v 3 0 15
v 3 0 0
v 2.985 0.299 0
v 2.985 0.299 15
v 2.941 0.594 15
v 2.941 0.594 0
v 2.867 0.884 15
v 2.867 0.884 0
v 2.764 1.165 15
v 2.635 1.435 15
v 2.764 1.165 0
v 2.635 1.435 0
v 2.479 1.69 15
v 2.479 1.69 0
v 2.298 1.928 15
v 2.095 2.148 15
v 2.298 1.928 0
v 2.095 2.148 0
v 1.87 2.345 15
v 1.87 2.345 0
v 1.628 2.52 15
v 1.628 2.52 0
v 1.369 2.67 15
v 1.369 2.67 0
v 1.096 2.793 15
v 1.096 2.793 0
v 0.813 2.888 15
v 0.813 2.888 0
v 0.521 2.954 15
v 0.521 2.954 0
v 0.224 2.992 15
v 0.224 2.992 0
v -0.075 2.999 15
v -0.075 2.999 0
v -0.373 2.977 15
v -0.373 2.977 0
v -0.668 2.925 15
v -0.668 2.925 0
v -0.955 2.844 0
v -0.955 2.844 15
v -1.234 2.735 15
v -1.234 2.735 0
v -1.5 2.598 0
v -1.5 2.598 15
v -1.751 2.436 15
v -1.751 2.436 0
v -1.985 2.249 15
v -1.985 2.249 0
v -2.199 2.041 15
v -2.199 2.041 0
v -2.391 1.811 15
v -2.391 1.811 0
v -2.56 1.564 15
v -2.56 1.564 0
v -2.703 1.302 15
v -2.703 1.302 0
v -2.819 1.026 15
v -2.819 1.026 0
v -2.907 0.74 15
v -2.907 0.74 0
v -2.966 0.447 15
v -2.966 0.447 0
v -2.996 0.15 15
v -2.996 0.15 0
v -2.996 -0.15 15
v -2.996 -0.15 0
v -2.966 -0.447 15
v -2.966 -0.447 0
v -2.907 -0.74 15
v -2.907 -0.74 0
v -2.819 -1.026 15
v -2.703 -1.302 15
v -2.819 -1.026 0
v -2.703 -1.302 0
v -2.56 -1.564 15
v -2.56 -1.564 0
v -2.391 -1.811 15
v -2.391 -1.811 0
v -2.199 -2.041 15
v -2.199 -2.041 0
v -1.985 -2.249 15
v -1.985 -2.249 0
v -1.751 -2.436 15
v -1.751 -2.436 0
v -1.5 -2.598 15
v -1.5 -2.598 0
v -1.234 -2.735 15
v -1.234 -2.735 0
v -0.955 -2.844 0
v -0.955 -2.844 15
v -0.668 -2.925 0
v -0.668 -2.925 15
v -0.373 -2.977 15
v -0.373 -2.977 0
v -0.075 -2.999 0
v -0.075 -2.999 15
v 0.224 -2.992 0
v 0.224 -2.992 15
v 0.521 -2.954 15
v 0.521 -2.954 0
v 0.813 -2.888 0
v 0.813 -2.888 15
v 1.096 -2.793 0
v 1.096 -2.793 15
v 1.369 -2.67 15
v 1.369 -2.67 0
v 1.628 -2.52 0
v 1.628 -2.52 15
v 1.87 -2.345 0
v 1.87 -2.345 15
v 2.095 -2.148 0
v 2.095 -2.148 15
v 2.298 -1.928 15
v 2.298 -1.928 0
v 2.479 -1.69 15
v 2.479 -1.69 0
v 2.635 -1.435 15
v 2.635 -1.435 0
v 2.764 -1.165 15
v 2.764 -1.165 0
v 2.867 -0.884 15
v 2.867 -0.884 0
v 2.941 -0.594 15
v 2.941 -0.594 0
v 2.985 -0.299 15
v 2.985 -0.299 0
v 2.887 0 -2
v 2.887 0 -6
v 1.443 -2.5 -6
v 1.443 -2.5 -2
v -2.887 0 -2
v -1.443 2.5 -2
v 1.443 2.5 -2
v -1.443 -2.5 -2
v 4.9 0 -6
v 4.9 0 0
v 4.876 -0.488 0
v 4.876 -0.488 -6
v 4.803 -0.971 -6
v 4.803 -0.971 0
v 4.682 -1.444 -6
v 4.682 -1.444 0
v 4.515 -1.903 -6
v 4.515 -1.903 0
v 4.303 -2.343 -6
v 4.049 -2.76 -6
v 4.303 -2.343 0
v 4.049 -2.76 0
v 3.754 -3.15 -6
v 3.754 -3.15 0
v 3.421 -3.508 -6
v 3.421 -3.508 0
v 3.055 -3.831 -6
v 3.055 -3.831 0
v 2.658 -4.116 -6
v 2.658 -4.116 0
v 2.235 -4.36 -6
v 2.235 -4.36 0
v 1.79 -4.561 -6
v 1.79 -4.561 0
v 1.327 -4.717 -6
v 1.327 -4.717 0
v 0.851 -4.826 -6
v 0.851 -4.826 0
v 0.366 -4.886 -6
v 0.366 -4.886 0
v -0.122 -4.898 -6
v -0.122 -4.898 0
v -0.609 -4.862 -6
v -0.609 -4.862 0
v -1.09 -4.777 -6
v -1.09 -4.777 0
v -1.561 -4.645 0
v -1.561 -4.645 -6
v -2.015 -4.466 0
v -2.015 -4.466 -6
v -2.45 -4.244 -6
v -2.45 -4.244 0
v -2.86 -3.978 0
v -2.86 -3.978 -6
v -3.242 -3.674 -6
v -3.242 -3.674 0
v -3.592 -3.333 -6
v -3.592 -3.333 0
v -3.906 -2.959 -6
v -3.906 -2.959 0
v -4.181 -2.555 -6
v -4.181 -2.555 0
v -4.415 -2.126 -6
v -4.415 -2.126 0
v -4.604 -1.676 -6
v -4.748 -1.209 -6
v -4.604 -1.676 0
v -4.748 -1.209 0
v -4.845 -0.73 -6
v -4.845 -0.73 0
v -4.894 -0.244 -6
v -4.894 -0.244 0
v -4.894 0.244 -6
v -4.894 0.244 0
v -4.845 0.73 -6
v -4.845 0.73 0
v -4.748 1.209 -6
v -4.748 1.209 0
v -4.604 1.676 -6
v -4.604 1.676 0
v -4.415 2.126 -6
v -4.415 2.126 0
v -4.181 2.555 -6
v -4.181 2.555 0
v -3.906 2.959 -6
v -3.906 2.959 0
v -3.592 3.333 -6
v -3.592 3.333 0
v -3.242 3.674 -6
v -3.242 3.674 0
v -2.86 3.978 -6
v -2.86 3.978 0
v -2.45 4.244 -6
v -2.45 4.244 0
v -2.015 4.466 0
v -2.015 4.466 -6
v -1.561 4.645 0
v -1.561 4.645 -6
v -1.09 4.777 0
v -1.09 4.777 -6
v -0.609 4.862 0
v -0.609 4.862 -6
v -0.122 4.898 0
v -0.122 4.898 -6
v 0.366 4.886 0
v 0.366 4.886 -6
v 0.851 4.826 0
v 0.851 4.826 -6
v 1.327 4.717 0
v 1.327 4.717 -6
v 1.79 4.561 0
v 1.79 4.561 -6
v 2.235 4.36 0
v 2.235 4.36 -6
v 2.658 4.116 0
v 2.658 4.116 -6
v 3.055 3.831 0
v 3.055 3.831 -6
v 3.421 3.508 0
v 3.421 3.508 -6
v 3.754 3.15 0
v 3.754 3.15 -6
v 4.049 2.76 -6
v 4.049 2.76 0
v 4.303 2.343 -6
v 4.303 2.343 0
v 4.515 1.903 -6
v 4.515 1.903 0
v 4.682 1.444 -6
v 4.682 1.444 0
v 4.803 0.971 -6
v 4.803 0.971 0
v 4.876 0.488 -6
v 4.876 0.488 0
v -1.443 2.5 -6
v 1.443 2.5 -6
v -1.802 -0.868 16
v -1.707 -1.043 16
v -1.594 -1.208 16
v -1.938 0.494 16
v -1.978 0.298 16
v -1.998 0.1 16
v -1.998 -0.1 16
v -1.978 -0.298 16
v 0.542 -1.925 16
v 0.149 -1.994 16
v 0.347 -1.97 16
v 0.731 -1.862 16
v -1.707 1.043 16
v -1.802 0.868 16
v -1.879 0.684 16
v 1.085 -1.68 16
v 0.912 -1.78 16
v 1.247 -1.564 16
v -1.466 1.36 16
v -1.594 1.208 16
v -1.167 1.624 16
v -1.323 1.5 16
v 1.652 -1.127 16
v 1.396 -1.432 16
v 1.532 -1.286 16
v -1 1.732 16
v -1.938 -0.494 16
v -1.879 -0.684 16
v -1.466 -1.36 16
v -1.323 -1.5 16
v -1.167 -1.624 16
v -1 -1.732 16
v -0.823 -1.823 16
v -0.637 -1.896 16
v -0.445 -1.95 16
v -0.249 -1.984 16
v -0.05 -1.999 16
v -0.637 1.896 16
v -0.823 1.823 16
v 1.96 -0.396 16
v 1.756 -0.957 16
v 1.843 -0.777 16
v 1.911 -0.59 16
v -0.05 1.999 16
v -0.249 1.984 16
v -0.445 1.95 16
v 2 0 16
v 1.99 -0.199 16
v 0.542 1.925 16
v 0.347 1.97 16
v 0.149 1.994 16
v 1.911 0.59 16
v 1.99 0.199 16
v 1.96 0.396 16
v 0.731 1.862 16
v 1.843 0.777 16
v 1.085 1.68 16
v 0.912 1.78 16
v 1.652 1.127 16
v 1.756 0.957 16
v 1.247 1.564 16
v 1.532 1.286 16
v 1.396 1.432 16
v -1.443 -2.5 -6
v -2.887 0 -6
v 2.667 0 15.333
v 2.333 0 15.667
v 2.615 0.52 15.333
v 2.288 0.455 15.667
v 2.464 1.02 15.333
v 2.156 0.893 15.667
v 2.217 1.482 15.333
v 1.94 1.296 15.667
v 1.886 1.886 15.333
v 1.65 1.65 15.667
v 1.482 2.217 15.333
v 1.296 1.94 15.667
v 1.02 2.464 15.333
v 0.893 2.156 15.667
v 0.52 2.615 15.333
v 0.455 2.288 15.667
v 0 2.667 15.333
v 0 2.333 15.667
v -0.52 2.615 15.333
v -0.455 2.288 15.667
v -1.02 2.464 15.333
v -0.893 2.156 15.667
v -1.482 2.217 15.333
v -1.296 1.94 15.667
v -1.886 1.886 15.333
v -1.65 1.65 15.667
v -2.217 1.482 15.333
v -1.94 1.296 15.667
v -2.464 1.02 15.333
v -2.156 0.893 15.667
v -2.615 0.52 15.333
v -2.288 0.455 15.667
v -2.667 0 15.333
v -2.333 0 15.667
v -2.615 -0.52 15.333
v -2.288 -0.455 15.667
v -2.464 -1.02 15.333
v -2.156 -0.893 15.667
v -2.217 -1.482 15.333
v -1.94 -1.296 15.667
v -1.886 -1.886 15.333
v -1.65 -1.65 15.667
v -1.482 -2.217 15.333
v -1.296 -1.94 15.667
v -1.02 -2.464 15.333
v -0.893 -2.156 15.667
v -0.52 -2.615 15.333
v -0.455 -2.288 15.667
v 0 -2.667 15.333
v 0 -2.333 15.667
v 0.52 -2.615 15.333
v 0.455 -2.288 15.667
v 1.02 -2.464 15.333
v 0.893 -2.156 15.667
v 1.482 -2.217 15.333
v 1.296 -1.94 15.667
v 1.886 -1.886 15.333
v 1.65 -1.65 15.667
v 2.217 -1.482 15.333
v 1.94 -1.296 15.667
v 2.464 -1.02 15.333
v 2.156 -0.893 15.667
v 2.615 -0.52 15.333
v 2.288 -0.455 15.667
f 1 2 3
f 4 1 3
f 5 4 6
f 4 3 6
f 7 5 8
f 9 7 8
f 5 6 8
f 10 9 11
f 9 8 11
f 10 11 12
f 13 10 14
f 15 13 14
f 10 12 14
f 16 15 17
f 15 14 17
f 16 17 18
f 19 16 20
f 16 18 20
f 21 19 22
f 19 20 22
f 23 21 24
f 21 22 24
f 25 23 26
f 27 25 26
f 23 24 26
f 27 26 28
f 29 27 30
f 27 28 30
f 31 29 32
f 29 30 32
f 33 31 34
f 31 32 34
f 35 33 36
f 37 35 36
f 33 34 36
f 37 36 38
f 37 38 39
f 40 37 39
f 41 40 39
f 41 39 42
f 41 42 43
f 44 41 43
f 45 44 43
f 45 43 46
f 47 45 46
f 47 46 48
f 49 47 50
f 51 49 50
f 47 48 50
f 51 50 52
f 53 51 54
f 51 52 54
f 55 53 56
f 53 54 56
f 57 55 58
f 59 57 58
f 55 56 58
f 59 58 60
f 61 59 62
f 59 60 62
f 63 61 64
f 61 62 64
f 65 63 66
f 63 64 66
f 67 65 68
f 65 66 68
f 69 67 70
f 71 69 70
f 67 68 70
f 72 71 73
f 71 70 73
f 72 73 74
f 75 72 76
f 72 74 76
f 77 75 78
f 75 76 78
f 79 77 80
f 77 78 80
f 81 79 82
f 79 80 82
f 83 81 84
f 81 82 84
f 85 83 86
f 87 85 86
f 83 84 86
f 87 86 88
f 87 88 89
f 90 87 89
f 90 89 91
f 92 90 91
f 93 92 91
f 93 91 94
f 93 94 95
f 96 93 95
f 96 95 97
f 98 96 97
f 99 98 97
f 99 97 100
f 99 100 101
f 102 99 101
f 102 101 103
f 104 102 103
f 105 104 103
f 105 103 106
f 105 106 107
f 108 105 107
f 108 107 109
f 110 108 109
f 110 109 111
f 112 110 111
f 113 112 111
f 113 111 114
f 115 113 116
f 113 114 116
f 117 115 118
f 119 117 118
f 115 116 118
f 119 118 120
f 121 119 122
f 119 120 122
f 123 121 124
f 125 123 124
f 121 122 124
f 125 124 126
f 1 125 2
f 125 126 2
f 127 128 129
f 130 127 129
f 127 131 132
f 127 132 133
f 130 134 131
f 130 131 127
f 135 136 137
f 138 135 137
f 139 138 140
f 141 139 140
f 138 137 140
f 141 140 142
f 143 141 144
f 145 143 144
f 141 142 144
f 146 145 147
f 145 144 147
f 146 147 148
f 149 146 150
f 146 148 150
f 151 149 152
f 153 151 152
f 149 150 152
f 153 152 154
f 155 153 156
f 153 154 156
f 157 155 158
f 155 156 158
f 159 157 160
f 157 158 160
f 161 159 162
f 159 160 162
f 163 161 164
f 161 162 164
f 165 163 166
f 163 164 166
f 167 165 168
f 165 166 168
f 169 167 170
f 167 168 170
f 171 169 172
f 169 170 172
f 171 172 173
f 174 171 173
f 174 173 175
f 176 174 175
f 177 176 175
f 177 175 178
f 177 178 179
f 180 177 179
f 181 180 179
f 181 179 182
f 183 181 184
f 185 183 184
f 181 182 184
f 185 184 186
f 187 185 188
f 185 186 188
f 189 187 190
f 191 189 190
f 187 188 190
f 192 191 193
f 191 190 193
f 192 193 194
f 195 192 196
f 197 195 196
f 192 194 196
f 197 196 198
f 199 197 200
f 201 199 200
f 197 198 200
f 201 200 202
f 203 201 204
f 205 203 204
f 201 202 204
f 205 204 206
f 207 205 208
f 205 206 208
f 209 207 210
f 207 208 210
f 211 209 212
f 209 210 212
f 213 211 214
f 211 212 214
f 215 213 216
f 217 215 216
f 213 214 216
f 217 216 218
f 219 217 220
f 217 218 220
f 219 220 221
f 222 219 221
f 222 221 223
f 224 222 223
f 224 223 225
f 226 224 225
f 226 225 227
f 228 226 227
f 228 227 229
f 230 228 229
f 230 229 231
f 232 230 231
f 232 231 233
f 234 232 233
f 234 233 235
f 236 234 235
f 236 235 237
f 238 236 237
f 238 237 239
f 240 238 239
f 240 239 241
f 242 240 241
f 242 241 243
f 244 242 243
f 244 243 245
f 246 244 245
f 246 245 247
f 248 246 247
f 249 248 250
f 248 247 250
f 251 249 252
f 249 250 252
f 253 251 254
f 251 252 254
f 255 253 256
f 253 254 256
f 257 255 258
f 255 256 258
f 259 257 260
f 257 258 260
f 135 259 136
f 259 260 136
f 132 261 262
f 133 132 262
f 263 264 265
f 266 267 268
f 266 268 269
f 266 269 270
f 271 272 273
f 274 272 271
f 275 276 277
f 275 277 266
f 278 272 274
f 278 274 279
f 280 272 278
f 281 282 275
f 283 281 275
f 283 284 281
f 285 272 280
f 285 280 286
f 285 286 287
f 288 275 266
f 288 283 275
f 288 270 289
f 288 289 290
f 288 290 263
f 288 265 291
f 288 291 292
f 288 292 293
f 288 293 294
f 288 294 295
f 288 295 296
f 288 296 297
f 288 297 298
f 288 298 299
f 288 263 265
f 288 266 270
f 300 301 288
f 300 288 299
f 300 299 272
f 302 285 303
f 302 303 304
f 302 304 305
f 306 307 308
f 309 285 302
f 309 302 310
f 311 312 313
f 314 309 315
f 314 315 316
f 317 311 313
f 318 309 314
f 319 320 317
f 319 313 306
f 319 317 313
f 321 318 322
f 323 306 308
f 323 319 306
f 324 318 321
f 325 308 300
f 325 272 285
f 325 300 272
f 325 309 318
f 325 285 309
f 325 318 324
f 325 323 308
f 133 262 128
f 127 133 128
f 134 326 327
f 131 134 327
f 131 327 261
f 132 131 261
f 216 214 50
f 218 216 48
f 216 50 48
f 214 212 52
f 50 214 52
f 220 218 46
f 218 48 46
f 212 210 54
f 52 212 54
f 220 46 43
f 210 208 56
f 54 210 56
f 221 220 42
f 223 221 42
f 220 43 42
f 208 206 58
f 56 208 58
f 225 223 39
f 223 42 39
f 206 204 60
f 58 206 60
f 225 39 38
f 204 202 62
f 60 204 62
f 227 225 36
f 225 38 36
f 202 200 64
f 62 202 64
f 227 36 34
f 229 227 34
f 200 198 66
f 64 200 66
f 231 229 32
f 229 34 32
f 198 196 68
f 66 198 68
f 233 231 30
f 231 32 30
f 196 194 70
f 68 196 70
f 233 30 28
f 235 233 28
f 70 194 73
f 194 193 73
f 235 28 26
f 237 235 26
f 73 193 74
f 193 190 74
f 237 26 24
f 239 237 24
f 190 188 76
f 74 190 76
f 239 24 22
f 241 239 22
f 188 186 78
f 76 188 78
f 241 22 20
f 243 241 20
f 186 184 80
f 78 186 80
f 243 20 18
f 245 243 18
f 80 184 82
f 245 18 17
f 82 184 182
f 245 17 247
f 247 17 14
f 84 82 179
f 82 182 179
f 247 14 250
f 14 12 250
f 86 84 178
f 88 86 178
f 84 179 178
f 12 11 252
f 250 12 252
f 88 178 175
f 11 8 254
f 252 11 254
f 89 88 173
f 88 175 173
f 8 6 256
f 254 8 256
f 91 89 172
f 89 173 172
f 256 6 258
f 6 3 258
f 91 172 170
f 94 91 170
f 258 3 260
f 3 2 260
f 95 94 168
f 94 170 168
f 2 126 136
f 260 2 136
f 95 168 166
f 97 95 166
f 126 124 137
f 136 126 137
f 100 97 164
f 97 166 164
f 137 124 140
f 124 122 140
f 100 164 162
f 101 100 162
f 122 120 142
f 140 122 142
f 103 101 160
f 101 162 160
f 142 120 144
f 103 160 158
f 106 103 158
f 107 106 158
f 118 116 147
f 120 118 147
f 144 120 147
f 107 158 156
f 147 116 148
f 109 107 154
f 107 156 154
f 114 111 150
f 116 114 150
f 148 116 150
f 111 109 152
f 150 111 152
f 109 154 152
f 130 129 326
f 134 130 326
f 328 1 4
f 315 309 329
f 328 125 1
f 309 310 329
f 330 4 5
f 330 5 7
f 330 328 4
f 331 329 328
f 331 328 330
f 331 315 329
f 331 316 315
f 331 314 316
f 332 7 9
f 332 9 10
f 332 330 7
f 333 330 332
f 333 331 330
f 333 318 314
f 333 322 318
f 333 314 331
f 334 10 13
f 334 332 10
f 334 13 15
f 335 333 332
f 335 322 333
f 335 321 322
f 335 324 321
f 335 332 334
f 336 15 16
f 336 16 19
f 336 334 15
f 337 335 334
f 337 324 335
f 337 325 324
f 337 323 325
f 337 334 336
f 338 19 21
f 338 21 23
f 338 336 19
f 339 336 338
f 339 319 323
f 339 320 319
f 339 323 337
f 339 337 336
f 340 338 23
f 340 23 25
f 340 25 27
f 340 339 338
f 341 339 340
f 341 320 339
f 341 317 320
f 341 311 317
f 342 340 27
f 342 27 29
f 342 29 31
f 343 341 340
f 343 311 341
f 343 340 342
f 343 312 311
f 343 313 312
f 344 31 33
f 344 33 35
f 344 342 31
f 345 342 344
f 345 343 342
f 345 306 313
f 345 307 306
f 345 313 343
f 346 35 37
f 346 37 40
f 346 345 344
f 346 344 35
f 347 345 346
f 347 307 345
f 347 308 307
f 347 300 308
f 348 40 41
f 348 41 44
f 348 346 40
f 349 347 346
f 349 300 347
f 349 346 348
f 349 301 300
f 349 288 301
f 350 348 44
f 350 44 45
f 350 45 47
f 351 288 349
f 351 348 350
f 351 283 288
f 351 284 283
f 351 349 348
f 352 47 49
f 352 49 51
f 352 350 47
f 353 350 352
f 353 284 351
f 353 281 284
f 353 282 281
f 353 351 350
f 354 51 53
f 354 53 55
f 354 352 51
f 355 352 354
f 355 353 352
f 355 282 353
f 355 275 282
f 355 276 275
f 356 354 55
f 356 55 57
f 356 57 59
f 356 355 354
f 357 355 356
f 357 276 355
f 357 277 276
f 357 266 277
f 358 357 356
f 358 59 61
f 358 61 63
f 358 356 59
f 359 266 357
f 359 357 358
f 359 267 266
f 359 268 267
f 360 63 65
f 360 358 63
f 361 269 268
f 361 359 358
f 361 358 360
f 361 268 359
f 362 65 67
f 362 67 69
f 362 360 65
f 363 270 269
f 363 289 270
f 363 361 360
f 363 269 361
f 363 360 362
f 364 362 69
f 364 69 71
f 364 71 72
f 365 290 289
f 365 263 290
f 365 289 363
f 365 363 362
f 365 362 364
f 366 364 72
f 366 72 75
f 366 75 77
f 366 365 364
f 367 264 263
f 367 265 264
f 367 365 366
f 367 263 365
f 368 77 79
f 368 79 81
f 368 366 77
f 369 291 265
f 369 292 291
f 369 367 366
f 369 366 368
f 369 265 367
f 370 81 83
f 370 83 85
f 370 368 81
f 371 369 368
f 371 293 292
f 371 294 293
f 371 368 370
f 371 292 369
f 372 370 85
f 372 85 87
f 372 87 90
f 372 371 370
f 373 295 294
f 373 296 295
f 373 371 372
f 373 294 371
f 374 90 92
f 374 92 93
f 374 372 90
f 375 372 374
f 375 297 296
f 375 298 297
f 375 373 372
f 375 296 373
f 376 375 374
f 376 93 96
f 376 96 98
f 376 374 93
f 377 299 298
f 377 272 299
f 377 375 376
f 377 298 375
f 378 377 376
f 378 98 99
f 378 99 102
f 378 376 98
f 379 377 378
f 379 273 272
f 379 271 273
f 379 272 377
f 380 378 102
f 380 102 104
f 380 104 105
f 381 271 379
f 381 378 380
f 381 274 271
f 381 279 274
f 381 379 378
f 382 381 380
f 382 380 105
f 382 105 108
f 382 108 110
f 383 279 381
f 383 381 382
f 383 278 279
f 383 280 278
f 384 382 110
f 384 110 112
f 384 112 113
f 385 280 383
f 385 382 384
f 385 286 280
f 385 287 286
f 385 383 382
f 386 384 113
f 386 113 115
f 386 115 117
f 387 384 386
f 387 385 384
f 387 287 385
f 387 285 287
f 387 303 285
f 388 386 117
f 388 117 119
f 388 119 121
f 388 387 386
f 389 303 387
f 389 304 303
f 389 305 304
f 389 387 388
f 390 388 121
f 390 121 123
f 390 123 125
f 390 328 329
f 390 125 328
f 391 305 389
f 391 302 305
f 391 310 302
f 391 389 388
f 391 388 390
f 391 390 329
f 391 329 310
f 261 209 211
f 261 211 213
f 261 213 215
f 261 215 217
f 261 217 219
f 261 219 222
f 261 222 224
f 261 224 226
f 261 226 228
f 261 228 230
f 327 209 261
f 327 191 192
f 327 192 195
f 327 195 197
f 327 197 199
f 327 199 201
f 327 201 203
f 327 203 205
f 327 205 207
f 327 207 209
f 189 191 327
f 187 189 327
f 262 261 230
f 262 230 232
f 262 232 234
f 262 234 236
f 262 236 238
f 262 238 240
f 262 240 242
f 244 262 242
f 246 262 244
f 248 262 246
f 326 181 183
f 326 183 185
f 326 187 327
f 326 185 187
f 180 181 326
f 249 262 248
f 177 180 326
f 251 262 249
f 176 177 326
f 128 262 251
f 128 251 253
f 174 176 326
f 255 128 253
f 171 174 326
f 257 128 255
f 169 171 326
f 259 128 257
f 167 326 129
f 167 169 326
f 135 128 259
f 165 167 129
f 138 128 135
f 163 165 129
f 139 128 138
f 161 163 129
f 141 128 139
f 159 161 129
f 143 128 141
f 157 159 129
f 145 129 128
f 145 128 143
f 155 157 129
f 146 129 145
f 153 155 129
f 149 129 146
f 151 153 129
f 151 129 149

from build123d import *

# Parameters (mm, degrees)
F0_R     = 3
F1_DEPTH = 16
F2_R     = 4.9
F3_DEPTH = 6
F5_DEPTH = 4
F6_SIZE  = 1


with BuildPart() as f1:
    # F0 (on Top) → F1 (new body)
    with BuildSketch(Plane.XY):
        Circle(F0_R)
    extrude(amount=F1_DEPTH)

    # F2 (on face) → F3 (join)
    with BuildSketch(Plane(origin=(0, 0, 0), x_dir=(1, 0, 0), z_dir=(0, 0, -1))):
        Circle(F2_R)
    extrude(amount=F3_DEPTH)

    # F4 (on face) → F5 (cut)
    with BuildSketch(Plane(origin=(0, 0, -6), x_dir=(1, 0, 0), z_dir=(0, 0, -1))):
        Polygon((1.443376, 2.5), (-1.443376, 2.5), (-2.886751, 0), (-1.443376, -2.5), (1.443376, -2.5), (2.886751, 0), align=None)
    extrude(amount=-F5_DEPTH, mode=Mode.SUBTRACT)

    # F6
    f6_edges = [f1.edges().sort_by_distance(p)[0] for p in [
        (-3, 0, 16),
    ]]
    chamfer(f6_edges, length=F6_SIZE)


solid = f1.part
